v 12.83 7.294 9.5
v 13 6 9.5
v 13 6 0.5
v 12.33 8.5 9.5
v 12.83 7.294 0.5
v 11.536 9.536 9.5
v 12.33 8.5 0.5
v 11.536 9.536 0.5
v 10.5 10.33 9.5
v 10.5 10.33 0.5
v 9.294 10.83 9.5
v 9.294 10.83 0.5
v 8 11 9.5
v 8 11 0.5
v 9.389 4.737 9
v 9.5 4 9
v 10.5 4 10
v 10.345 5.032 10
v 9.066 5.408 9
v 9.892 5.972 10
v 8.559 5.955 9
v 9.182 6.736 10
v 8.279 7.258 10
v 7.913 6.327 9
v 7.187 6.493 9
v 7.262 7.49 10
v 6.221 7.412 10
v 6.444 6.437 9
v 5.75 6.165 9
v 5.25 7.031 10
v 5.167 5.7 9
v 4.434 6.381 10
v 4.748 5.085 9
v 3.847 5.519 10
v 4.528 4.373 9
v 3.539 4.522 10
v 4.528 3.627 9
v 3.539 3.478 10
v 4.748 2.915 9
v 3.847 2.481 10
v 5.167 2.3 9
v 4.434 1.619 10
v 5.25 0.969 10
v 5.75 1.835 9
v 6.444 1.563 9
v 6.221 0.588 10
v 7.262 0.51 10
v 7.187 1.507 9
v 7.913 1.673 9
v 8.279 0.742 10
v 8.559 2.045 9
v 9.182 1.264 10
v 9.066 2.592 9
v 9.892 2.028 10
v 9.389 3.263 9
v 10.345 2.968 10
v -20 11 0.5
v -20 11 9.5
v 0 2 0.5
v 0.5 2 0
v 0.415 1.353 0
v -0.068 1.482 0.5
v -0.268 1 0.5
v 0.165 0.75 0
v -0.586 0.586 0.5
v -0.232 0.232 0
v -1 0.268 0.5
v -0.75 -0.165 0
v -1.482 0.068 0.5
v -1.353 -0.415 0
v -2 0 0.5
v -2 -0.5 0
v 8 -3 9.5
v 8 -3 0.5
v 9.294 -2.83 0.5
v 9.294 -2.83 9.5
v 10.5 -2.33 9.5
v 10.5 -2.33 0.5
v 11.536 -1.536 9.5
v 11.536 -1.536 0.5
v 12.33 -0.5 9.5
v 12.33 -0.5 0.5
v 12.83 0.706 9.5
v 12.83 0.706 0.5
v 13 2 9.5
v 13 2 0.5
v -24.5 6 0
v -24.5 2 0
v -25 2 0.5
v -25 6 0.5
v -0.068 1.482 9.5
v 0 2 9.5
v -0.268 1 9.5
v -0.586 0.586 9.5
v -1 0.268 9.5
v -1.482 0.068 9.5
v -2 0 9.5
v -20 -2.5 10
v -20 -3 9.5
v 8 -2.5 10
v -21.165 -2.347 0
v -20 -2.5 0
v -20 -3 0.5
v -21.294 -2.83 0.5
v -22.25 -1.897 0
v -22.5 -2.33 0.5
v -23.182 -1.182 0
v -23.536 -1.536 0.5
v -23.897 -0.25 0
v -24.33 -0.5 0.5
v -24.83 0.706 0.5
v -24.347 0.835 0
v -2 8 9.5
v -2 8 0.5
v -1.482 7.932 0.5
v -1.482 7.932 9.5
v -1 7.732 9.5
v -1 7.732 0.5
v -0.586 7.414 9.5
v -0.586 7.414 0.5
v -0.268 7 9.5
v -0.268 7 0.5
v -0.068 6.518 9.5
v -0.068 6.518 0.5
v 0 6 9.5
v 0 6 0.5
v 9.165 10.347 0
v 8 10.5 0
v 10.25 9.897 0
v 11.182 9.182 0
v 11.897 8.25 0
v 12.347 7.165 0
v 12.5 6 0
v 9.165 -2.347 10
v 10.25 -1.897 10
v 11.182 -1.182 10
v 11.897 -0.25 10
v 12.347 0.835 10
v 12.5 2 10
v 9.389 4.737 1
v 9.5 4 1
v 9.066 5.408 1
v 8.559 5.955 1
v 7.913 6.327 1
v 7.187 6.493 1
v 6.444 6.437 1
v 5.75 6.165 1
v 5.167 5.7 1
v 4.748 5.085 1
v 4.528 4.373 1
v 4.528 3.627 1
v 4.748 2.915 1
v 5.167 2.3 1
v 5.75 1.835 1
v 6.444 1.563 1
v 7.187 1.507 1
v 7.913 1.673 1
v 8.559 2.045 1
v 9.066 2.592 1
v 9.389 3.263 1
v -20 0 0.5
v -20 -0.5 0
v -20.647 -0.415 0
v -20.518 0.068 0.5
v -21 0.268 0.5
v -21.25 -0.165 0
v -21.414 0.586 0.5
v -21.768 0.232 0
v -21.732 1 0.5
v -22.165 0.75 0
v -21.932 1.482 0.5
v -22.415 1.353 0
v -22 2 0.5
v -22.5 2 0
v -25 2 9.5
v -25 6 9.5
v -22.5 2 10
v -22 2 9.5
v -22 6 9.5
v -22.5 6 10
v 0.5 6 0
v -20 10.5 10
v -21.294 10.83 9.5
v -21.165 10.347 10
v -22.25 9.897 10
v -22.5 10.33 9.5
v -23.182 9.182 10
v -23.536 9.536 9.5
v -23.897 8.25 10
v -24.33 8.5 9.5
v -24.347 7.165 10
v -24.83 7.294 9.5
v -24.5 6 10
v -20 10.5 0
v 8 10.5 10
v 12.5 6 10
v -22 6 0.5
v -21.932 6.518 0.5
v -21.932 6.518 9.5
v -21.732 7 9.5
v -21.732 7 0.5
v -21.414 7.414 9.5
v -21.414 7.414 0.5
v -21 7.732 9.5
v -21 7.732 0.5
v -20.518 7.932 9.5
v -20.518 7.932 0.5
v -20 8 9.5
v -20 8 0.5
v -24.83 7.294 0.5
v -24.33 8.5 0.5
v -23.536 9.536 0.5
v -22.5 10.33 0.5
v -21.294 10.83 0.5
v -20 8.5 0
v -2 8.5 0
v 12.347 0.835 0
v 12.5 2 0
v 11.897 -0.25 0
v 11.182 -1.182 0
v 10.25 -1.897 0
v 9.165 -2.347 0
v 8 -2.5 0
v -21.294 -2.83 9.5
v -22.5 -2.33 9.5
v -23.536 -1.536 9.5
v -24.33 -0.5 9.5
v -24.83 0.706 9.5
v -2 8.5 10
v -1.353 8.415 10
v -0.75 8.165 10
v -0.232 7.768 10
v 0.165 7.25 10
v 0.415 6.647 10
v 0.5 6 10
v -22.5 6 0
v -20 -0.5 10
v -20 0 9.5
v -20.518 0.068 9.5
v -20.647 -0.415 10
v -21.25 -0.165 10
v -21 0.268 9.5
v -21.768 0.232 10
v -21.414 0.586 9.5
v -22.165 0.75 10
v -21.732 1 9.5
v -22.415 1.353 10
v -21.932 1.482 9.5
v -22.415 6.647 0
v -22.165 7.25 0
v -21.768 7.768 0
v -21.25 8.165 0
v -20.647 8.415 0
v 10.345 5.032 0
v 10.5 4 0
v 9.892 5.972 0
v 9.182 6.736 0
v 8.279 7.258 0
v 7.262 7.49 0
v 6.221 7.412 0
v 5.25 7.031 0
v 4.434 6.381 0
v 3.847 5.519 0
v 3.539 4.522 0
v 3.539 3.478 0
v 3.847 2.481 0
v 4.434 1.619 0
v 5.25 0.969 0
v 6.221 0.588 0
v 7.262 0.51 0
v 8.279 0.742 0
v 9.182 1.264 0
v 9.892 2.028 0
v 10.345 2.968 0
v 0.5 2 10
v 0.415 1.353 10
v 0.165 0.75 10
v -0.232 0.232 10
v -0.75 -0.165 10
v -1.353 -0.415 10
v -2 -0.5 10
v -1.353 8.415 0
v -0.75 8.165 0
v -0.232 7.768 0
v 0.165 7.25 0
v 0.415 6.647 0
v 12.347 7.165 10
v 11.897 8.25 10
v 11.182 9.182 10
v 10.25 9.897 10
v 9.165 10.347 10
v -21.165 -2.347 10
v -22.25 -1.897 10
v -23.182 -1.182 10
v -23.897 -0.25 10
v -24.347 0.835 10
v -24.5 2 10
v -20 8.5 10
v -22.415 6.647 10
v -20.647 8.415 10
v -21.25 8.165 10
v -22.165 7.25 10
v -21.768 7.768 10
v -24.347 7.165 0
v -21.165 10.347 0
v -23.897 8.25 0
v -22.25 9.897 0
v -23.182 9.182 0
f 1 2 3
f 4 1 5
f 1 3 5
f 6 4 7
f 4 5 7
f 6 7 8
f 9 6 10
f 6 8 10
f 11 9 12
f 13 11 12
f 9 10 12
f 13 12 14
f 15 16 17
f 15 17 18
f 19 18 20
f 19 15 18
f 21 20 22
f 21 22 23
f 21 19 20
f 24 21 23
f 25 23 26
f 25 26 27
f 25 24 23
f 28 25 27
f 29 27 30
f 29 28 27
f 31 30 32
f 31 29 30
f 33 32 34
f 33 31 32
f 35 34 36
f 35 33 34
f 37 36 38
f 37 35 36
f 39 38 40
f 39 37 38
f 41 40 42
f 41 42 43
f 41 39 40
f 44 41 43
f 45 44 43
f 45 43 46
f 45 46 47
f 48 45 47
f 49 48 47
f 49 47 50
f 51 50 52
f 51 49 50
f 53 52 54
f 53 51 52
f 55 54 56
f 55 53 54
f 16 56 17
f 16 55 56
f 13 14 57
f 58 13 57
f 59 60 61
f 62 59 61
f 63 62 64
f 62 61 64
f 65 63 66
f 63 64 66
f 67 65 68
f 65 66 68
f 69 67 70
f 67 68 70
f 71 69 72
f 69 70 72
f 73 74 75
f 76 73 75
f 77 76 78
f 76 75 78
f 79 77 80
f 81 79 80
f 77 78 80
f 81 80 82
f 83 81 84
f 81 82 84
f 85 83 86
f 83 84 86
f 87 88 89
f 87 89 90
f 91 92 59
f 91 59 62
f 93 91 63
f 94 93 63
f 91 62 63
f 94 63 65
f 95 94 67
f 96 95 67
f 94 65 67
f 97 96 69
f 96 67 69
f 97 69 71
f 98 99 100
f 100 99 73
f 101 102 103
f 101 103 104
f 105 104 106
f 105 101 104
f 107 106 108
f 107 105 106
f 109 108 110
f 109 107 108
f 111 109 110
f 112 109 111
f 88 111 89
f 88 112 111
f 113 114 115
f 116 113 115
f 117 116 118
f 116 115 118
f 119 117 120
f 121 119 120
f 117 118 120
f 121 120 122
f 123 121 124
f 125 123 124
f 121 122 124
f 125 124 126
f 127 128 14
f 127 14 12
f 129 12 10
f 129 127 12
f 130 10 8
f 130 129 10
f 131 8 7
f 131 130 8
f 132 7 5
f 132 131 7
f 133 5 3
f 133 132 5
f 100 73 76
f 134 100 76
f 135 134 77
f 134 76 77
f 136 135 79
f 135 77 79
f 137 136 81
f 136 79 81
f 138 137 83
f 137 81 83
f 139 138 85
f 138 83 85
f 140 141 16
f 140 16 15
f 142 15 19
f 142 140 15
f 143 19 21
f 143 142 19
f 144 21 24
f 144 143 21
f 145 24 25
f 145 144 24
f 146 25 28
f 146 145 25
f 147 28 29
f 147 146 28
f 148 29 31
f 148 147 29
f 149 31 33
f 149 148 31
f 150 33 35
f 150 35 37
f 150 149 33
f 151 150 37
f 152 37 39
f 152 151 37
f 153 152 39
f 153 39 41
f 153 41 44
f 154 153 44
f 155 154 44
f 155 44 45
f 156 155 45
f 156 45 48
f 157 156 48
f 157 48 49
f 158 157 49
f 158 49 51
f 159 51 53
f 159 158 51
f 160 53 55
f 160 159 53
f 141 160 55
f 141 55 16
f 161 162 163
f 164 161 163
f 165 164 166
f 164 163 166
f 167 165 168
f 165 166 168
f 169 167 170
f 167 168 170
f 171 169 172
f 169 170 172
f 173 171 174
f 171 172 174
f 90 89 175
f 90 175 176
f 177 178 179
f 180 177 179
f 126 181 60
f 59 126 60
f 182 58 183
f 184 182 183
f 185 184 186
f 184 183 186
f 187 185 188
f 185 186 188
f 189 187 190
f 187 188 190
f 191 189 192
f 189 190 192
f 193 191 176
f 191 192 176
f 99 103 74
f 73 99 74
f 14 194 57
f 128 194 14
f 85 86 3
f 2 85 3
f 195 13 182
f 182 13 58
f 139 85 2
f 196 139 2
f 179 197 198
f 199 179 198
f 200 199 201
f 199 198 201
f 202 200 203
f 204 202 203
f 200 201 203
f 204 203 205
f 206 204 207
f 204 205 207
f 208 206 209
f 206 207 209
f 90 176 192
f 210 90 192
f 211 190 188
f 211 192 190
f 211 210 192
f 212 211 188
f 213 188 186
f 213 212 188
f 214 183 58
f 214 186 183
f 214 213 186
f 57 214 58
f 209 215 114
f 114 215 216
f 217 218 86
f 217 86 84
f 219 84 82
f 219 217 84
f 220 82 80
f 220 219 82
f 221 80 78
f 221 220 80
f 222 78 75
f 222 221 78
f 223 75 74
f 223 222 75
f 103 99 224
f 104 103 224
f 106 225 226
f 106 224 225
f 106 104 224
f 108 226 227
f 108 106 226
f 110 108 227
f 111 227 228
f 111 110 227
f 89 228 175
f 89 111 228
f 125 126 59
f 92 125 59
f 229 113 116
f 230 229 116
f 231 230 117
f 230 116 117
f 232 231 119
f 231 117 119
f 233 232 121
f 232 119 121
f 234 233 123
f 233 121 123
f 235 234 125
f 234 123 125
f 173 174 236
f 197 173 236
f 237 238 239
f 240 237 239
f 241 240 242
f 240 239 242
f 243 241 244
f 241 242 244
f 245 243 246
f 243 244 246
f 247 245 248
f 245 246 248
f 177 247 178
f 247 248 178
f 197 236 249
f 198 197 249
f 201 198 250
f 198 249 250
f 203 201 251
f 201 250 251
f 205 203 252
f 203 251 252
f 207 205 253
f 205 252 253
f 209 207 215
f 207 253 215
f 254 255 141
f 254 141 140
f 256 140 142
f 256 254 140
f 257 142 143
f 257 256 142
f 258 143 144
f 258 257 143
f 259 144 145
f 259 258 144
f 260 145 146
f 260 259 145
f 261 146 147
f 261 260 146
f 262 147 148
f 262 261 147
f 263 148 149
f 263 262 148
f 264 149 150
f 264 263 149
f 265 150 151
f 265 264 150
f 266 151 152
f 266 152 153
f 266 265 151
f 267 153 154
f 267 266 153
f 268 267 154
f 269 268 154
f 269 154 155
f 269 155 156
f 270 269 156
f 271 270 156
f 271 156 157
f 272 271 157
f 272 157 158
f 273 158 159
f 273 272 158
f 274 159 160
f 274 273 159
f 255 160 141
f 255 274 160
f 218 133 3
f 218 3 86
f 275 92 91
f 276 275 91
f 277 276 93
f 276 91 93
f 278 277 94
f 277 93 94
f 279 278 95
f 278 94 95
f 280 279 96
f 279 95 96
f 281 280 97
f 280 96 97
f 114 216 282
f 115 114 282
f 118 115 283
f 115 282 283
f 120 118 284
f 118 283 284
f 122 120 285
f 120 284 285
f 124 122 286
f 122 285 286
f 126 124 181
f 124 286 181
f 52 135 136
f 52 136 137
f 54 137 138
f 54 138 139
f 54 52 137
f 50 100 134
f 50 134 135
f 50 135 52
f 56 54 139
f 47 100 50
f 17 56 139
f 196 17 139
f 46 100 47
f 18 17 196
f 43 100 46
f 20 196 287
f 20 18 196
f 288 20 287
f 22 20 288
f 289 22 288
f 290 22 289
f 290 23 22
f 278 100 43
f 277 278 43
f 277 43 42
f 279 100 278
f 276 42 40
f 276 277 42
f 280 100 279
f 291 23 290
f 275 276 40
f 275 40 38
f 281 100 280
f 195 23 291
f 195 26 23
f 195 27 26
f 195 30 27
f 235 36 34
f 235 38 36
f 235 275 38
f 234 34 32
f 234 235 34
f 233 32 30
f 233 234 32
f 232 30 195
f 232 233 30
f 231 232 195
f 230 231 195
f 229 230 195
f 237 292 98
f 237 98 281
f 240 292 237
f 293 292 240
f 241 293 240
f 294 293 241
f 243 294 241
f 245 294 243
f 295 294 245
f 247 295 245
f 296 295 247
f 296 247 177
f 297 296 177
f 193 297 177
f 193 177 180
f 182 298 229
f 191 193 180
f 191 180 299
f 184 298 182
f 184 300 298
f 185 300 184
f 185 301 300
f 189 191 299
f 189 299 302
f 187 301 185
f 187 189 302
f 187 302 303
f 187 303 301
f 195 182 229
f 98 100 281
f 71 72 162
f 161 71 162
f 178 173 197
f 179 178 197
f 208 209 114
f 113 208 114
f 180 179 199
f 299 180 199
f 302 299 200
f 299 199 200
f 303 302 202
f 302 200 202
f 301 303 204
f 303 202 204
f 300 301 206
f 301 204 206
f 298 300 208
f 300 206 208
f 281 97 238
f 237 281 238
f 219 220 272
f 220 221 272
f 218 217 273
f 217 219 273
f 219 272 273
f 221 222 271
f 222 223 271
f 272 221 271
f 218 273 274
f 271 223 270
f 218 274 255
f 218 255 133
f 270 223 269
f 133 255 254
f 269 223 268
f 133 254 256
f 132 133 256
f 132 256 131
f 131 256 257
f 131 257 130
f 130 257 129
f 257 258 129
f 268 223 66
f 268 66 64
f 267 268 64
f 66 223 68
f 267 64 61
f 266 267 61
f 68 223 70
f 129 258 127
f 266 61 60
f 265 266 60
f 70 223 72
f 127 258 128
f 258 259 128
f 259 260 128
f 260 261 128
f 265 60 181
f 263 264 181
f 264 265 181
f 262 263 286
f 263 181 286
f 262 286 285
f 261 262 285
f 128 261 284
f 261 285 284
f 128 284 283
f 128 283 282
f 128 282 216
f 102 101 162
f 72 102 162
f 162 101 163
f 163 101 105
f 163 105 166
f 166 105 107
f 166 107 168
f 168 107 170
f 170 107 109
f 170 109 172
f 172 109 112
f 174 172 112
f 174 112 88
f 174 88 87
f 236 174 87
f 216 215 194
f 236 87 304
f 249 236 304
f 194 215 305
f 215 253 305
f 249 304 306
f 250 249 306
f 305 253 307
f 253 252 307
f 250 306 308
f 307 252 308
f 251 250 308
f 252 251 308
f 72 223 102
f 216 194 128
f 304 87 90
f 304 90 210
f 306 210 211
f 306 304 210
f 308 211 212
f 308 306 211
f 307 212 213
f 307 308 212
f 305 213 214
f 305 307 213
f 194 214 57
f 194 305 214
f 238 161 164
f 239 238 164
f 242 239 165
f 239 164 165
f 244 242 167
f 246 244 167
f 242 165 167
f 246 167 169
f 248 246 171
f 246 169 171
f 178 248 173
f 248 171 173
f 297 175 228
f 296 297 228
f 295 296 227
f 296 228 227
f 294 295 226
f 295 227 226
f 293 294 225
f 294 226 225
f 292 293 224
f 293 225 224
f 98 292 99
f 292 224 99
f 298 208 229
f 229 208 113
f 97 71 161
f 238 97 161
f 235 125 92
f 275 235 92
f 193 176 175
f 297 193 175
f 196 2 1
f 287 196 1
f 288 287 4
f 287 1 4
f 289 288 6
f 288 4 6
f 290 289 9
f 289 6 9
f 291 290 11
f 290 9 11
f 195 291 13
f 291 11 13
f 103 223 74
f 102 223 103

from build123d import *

# Parameters (mm, degrees)
SKETCH1_R           = 2.5
BOSS_EXTRUDE1_DEPTH = 10
CHAMFER1_SIZE       = 1
CHAMFER2_SIZE       = 0.5


with BuildPart() as part:
    # Sketch1 → Boss-Extrude1 (new body)
    # profile 1 of 2: a face of its own
    with BuildSketch(Plane(origin=(0, 0, 0), x_dir=(0, 1, 0), z_dir=(0, 0, 1))):
        with BuildLine():
            ThreePointArc((-3, 20), (-1.535533906, 23.535533906), (2, 25))
            Line((2, 25), (6, 25))
            ThreePointArc((6, 25), (9.535533906, 23.535533906), (11, 20))
            Line((11, 20), (11, 2))
            ThreePointArc((11, 2), (9.535533906, -1.535533906), (6, -3))
            Line((6, -3), (2, -3))
            ThreePointArc((2, -3), (-1.535533906, -1.535533906), (-3, 2))
            Line((-3, 2), (-3, 20))
        make_face()
        with BuildLine():
            Line((2, 22), (6, 22))
            ThreePointArc((6, 22), (7.414213562, 21.414213562), (8, 20))
            Line((8, 20), (8, 2))
            ThreePointArc((8, 2), (7.414213562, 0.585786438), (6, 0))
            Line((6, 0), (2, 0))
            ThreePointArc((2, 0), (0.585786438, 0.585786438), (0, 2))
            Line((0, 2), (0, 20))
            ThreePointArc((0, 20), (0.585786438, 21.414213562), (2, 22))
        make_face(mode=Mode.SUBTRACT)
    # profile 2 of 2: a face of its own
    with BuildSketch(Plane(origin=(0, 0, 0), x_dir=(0, 1, 0), z_dir=(0, 0, 1))):
        with BuildLine():
            Line((2, -13), (6, -13))
            ThreePointArc((6, -13), (9.535533906, -11.535533906), (11, -8))
            Line((11, -8), (11, 2))
            ThreePointArc((11, 2), (9.535533906, -1.535533906), (6, -3))
            Line((6, -3), (2, -3))
            ThreePointArc((2, -3), (-1.535533906, -1.535533906), (-3, 2))
            Line((-3, 2), (-3, -8))
            ThreePointArc((-3, -8), (-1.535533906, -11.535533906), (2, -13))
        make_face()
        with Locations(Location((4, -7, 0), (0, 0, 270))):
            Circle(SKETCH1_R, mode=Mode.SUBTRACT)
    extrude(amount=BOSS_EXTRUDE1_DEPTH)

    # Chamfer1
    chamfer1_edges = [part.edges().sort_by_distance(p)[0] for p in [
        (4.5, 4, 0),
        (4.5, 4, 10),
    ]]
    chamfer(chamfer1_edges, length=CHAMFER1_SIZE)

    # Chamfer2
    chamfer2_edges = [part.edges().sort_by_distance(p)[0] for p in [
        (11.535533906, -1.535533906, 10),
        (13, 4, 10),
        (-21.414213562, 0.585786438, 0),
        (-11, 0, 0),
        (-0.585786438, 0.585786438, 0),
        (0, 4, 0),
        (-0.585786438, 7.414213562, 0),
        (-11, 8, 0),
        (-21.414213562, 7.414213562, 0),
        (-22, 4, 0),
        (11.535533906, 9.535533906, 10),
        (-23.535533906, -1.535533906, 0),
        (-25, 4, 0),
        (-23.535533906, 9.535533906, 0),
        (-6, 11, 0),
        (11.535533906, 9.535533906, 0),
        (13, 4, 0),
        (11.535533906, -1.535533906, 0),
        (-6, -3, 0),
        (-6, 11, 10),
        (-23.535533906, 9.535533906, 10),
        (-25, 4, 10),
        (-23.535533906, -1.535533906, 10),
        (-22, 4, 10),
        (-21.414213562, 7.414213562, 10),
        (-11, 8, 10),
        (-0.585786438, 7.414213562, 10),
        (-6, -3, 10),
        (0, 4, 10),
        (-0.585786438, 0.585786438, 10),
        (-11, 0, 10),
        (-21.414213562, 0.585786438, 10),
    ]]
    chamfer(chamfer2_edges, length=CHAMFER2_SIZE)


solid = part.part
